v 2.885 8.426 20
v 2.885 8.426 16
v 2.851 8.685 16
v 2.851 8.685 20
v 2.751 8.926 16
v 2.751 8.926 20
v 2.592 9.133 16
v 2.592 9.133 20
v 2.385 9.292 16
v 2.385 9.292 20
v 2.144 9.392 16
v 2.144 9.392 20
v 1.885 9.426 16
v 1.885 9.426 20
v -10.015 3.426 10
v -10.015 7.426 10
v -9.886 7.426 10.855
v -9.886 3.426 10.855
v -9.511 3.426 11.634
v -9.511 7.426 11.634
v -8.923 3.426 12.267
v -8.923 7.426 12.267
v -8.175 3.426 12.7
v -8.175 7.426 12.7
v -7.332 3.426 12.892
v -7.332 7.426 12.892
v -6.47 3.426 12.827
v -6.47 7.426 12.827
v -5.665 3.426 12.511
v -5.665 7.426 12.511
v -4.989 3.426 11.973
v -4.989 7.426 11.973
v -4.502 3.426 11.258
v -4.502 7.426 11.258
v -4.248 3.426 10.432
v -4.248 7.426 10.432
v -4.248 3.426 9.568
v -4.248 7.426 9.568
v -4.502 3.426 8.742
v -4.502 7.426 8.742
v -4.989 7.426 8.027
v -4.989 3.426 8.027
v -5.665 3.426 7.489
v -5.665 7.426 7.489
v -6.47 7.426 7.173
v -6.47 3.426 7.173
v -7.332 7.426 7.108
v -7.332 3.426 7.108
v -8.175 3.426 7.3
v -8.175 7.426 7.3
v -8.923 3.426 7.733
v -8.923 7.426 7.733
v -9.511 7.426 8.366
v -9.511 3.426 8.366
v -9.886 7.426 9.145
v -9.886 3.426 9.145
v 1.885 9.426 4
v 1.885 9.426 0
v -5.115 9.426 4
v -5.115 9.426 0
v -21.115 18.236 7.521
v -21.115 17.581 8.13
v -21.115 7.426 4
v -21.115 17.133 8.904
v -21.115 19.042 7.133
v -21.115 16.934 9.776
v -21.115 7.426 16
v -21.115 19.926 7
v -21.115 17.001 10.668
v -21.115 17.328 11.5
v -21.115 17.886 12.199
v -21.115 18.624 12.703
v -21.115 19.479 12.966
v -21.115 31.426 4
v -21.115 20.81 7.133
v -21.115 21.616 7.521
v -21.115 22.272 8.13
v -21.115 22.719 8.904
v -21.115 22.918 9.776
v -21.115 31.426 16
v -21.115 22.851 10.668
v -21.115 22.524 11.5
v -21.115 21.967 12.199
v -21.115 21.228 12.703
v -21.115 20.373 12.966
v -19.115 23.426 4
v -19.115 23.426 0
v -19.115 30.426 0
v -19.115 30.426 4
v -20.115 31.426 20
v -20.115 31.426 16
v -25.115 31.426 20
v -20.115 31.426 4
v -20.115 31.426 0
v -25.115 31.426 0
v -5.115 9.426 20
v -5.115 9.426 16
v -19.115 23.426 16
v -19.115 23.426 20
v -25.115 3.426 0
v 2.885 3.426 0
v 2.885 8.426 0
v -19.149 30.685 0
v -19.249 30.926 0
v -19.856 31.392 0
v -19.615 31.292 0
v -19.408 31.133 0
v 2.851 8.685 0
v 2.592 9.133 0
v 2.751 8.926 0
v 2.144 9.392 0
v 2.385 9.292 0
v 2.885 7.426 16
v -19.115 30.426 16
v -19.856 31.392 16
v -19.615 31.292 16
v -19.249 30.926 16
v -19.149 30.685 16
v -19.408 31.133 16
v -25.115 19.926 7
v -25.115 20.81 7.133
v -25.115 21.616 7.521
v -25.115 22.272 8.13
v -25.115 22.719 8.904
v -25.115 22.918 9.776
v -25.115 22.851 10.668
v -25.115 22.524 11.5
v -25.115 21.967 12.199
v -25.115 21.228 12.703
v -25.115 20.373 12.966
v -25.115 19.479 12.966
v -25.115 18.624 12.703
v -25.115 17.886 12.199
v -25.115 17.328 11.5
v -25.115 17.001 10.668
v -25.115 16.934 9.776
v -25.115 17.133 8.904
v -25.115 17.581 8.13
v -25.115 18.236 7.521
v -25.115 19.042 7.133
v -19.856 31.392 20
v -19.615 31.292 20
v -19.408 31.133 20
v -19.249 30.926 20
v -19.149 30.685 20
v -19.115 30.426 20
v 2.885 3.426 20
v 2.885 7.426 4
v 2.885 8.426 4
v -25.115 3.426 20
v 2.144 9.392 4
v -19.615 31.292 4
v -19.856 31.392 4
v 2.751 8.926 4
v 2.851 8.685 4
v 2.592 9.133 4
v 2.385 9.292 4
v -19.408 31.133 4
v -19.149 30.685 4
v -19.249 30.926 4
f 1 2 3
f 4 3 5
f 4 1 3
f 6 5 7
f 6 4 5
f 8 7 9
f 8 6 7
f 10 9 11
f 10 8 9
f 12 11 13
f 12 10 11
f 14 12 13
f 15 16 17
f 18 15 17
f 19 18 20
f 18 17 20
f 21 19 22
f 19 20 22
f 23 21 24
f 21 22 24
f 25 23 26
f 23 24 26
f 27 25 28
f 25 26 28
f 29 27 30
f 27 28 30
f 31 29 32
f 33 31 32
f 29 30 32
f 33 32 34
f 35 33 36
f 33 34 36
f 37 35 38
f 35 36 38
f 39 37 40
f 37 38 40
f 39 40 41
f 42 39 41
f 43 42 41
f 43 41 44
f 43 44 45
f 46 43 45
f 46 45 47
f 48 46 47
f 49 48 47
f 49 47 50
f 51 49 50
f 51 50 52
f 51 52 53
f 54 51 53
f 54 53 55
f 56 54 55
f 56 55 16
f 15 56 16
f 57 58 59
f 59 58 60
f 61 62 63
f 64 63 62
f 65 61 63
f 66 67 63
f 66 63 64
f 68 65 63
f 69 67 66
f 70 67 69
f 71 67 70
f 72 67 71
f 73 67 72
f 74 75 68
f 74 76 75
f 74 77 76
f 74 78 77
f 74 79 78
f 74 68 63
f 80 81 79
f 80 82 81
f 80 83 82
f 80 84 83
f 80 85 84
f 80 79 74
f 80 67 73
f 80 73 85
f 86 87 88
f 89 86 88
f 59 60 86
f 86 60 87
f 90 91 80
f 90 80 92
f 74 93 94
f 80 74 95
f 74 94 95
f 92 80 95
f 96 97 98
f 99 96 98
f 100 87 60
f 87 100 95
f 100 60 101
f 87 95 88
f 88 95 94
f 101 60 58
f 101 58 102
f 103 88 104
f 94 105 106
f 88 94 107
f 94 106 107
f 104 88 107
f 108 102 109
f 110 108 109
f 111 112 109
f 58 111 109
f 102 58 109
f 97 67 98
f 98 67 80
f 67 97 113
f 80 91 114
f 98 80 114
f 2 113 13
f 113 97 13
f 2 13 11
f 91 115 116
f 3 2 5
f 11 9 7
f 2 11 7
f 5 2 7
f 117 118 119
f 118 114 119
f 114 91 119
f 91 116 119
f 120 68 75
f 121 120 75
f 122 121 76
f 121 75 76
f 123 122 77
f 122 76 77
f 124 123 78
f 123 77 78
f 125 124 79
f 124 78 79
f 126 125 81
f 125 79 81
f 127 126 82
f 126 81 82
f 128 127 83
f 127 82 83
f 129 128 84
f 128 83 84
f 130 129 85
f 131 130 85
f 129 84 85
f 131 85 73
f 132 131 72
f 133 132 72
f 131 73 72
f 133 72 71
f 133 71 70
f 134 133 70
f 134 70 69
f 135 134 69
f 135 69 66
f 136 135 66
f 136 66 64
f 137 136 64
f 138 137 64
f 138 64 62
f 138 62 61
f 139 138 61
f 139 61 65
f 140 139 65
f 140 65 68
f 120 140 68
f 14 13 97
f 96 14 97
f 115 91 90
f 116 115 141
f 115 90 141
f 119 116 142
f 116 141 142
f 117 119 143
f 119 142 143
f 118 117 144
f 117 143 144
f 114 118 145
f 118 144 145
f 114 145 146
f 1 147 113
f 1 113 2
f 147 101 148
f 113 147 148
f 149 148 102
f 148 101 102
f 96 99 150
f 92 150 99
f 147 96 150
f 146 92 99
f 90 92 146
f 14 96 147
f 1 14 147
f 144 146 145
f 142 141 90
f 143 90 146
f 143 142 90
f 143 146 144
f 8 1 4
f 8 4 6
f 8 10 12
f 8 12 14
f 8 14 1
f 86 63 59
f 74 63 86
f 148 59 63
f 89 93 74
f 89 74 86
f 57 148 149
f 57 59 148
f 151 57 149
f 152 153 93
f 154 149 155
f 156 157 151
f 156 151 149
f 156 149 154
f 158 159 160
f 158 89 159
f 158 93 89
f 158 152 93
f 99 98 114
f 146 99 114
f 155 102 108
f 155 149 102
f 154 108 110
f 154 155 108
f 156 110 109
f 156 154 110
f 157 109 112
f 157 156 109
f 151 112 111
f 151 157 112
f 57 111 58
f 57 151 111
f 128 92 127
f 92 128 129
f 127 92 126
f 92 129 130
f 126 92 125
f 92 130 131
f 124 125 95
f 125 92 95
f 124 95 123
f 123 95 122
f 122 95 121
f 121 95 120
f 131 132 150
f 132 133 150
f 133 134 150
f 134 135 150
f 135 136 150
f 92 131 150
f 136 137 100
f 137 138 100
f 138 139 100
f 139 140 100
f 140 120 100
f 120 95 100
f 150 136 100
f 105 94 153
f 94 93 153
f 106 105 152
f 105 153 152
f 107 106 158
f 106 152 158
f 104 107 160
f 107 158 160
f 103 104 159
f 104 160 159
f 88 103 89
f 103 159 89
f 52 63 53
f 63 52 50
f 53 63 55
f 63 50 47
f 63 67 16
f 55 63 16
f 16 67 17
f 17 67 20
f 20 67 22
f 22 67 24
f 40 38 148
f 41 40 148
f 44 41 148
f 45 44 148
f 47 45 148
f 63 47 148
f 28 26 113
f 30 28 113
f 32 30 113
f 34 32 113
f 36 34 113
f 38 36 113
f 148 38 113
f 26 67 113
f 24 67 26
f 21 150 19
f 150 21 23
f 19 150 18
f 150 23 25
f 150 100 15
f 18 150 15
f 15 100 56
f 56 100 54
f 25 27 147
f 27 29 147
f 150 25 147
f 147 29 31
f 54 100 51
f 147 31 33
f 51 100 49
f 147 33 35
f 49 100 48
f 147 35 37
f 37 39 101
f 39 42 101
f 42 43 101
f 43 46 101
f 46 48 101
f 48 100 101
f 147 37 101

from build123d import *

# Parameters (mm, degrees)
BOSS_EXTRUDE1_DEPTH = 20
SKETCH2_W           = 36.386493836
SKETCH2_H           = 30.590666468
CUT_EXTRUDE1_DEPTH  = 6
SKETCH4_R           = 3
CUT_EXTRUDE2_DEPTH  = 12
SKETCH5_R           = 2.9
CUT_EXTRUDE3_DEPTH  = 12
FILLET1_R           = 1


with BuildPart() as part:
    # Sketch1 → Boss-Extrude1 (new body)
    with BuildSketch(Plane.XY):
        Polygon((-25.115207597, 31.4260495), (-25.115207597, 3.4260495), (2.884792403, 3.4260495), (2.884792403, 9.4260495), (-5.115207597, 9.4260495), (-19.115207597, 23.4260495), (-19.115207597, 31.4260495), align=None)
    extrude(amount=BOSS_EXTRUDE1_DEPTH)

    # Sketch2 → Cut-Extrude1 (cut, symmetric)
    with BuildSketch(Plane.XY.offset(10)):
        with Locations((-2.921960679, 22.721382734)):
            Rectangle(SKETCH2_W, SKETCH2_H)
    extrude(amount=CUT_EXTRUDE1_DEPTH, both=True, mode=Mode.SUBTRACT)

    # Sketch4 → Cut-Extrude2 (cut)
    with BuildSketch(Plane(origin=(-21.115207597, 0, 0), x_dir=(0, 0, -1), z_dir=(1, 0, 0))):
        with Locations((-10, 19.9260495)):
            Circle(SKETCH4_R)
    extrude(amount=-CUT_EXTRUDE2_DEPTH, mode=Mode.SUBTRACT)

    # Sketch5 → Cut-Extrude3 (cut)
    with BuildSketch(Plane(origin=(0, 7.4260495, 0), x_dir=(1, 0, 0), z_dir=(0, 1, 0))):
        with Locations(Location((-7.115207597, -10, 0), (0, 0, 180))):
            Circle(SKETCH5_R)
    extrude(amount=-CUT_EXTRUDE3_DEPTH, mode=Mode.SUBTRACT)

    # Fillet1
    fillet1_edges = [part.edges().sort_by_distance(p)[0] for p in [
        (-19.115207597, 31.4260495, 18),
        (2.884792403, 9.4260495, 18),
        (-19.115207597, 31.4260495, 2),
        (2.884792403, 9.4260495, 2),
    ]]
    fillet(fillet1_edges, radius=FILLET1_R)


solid = part.part
